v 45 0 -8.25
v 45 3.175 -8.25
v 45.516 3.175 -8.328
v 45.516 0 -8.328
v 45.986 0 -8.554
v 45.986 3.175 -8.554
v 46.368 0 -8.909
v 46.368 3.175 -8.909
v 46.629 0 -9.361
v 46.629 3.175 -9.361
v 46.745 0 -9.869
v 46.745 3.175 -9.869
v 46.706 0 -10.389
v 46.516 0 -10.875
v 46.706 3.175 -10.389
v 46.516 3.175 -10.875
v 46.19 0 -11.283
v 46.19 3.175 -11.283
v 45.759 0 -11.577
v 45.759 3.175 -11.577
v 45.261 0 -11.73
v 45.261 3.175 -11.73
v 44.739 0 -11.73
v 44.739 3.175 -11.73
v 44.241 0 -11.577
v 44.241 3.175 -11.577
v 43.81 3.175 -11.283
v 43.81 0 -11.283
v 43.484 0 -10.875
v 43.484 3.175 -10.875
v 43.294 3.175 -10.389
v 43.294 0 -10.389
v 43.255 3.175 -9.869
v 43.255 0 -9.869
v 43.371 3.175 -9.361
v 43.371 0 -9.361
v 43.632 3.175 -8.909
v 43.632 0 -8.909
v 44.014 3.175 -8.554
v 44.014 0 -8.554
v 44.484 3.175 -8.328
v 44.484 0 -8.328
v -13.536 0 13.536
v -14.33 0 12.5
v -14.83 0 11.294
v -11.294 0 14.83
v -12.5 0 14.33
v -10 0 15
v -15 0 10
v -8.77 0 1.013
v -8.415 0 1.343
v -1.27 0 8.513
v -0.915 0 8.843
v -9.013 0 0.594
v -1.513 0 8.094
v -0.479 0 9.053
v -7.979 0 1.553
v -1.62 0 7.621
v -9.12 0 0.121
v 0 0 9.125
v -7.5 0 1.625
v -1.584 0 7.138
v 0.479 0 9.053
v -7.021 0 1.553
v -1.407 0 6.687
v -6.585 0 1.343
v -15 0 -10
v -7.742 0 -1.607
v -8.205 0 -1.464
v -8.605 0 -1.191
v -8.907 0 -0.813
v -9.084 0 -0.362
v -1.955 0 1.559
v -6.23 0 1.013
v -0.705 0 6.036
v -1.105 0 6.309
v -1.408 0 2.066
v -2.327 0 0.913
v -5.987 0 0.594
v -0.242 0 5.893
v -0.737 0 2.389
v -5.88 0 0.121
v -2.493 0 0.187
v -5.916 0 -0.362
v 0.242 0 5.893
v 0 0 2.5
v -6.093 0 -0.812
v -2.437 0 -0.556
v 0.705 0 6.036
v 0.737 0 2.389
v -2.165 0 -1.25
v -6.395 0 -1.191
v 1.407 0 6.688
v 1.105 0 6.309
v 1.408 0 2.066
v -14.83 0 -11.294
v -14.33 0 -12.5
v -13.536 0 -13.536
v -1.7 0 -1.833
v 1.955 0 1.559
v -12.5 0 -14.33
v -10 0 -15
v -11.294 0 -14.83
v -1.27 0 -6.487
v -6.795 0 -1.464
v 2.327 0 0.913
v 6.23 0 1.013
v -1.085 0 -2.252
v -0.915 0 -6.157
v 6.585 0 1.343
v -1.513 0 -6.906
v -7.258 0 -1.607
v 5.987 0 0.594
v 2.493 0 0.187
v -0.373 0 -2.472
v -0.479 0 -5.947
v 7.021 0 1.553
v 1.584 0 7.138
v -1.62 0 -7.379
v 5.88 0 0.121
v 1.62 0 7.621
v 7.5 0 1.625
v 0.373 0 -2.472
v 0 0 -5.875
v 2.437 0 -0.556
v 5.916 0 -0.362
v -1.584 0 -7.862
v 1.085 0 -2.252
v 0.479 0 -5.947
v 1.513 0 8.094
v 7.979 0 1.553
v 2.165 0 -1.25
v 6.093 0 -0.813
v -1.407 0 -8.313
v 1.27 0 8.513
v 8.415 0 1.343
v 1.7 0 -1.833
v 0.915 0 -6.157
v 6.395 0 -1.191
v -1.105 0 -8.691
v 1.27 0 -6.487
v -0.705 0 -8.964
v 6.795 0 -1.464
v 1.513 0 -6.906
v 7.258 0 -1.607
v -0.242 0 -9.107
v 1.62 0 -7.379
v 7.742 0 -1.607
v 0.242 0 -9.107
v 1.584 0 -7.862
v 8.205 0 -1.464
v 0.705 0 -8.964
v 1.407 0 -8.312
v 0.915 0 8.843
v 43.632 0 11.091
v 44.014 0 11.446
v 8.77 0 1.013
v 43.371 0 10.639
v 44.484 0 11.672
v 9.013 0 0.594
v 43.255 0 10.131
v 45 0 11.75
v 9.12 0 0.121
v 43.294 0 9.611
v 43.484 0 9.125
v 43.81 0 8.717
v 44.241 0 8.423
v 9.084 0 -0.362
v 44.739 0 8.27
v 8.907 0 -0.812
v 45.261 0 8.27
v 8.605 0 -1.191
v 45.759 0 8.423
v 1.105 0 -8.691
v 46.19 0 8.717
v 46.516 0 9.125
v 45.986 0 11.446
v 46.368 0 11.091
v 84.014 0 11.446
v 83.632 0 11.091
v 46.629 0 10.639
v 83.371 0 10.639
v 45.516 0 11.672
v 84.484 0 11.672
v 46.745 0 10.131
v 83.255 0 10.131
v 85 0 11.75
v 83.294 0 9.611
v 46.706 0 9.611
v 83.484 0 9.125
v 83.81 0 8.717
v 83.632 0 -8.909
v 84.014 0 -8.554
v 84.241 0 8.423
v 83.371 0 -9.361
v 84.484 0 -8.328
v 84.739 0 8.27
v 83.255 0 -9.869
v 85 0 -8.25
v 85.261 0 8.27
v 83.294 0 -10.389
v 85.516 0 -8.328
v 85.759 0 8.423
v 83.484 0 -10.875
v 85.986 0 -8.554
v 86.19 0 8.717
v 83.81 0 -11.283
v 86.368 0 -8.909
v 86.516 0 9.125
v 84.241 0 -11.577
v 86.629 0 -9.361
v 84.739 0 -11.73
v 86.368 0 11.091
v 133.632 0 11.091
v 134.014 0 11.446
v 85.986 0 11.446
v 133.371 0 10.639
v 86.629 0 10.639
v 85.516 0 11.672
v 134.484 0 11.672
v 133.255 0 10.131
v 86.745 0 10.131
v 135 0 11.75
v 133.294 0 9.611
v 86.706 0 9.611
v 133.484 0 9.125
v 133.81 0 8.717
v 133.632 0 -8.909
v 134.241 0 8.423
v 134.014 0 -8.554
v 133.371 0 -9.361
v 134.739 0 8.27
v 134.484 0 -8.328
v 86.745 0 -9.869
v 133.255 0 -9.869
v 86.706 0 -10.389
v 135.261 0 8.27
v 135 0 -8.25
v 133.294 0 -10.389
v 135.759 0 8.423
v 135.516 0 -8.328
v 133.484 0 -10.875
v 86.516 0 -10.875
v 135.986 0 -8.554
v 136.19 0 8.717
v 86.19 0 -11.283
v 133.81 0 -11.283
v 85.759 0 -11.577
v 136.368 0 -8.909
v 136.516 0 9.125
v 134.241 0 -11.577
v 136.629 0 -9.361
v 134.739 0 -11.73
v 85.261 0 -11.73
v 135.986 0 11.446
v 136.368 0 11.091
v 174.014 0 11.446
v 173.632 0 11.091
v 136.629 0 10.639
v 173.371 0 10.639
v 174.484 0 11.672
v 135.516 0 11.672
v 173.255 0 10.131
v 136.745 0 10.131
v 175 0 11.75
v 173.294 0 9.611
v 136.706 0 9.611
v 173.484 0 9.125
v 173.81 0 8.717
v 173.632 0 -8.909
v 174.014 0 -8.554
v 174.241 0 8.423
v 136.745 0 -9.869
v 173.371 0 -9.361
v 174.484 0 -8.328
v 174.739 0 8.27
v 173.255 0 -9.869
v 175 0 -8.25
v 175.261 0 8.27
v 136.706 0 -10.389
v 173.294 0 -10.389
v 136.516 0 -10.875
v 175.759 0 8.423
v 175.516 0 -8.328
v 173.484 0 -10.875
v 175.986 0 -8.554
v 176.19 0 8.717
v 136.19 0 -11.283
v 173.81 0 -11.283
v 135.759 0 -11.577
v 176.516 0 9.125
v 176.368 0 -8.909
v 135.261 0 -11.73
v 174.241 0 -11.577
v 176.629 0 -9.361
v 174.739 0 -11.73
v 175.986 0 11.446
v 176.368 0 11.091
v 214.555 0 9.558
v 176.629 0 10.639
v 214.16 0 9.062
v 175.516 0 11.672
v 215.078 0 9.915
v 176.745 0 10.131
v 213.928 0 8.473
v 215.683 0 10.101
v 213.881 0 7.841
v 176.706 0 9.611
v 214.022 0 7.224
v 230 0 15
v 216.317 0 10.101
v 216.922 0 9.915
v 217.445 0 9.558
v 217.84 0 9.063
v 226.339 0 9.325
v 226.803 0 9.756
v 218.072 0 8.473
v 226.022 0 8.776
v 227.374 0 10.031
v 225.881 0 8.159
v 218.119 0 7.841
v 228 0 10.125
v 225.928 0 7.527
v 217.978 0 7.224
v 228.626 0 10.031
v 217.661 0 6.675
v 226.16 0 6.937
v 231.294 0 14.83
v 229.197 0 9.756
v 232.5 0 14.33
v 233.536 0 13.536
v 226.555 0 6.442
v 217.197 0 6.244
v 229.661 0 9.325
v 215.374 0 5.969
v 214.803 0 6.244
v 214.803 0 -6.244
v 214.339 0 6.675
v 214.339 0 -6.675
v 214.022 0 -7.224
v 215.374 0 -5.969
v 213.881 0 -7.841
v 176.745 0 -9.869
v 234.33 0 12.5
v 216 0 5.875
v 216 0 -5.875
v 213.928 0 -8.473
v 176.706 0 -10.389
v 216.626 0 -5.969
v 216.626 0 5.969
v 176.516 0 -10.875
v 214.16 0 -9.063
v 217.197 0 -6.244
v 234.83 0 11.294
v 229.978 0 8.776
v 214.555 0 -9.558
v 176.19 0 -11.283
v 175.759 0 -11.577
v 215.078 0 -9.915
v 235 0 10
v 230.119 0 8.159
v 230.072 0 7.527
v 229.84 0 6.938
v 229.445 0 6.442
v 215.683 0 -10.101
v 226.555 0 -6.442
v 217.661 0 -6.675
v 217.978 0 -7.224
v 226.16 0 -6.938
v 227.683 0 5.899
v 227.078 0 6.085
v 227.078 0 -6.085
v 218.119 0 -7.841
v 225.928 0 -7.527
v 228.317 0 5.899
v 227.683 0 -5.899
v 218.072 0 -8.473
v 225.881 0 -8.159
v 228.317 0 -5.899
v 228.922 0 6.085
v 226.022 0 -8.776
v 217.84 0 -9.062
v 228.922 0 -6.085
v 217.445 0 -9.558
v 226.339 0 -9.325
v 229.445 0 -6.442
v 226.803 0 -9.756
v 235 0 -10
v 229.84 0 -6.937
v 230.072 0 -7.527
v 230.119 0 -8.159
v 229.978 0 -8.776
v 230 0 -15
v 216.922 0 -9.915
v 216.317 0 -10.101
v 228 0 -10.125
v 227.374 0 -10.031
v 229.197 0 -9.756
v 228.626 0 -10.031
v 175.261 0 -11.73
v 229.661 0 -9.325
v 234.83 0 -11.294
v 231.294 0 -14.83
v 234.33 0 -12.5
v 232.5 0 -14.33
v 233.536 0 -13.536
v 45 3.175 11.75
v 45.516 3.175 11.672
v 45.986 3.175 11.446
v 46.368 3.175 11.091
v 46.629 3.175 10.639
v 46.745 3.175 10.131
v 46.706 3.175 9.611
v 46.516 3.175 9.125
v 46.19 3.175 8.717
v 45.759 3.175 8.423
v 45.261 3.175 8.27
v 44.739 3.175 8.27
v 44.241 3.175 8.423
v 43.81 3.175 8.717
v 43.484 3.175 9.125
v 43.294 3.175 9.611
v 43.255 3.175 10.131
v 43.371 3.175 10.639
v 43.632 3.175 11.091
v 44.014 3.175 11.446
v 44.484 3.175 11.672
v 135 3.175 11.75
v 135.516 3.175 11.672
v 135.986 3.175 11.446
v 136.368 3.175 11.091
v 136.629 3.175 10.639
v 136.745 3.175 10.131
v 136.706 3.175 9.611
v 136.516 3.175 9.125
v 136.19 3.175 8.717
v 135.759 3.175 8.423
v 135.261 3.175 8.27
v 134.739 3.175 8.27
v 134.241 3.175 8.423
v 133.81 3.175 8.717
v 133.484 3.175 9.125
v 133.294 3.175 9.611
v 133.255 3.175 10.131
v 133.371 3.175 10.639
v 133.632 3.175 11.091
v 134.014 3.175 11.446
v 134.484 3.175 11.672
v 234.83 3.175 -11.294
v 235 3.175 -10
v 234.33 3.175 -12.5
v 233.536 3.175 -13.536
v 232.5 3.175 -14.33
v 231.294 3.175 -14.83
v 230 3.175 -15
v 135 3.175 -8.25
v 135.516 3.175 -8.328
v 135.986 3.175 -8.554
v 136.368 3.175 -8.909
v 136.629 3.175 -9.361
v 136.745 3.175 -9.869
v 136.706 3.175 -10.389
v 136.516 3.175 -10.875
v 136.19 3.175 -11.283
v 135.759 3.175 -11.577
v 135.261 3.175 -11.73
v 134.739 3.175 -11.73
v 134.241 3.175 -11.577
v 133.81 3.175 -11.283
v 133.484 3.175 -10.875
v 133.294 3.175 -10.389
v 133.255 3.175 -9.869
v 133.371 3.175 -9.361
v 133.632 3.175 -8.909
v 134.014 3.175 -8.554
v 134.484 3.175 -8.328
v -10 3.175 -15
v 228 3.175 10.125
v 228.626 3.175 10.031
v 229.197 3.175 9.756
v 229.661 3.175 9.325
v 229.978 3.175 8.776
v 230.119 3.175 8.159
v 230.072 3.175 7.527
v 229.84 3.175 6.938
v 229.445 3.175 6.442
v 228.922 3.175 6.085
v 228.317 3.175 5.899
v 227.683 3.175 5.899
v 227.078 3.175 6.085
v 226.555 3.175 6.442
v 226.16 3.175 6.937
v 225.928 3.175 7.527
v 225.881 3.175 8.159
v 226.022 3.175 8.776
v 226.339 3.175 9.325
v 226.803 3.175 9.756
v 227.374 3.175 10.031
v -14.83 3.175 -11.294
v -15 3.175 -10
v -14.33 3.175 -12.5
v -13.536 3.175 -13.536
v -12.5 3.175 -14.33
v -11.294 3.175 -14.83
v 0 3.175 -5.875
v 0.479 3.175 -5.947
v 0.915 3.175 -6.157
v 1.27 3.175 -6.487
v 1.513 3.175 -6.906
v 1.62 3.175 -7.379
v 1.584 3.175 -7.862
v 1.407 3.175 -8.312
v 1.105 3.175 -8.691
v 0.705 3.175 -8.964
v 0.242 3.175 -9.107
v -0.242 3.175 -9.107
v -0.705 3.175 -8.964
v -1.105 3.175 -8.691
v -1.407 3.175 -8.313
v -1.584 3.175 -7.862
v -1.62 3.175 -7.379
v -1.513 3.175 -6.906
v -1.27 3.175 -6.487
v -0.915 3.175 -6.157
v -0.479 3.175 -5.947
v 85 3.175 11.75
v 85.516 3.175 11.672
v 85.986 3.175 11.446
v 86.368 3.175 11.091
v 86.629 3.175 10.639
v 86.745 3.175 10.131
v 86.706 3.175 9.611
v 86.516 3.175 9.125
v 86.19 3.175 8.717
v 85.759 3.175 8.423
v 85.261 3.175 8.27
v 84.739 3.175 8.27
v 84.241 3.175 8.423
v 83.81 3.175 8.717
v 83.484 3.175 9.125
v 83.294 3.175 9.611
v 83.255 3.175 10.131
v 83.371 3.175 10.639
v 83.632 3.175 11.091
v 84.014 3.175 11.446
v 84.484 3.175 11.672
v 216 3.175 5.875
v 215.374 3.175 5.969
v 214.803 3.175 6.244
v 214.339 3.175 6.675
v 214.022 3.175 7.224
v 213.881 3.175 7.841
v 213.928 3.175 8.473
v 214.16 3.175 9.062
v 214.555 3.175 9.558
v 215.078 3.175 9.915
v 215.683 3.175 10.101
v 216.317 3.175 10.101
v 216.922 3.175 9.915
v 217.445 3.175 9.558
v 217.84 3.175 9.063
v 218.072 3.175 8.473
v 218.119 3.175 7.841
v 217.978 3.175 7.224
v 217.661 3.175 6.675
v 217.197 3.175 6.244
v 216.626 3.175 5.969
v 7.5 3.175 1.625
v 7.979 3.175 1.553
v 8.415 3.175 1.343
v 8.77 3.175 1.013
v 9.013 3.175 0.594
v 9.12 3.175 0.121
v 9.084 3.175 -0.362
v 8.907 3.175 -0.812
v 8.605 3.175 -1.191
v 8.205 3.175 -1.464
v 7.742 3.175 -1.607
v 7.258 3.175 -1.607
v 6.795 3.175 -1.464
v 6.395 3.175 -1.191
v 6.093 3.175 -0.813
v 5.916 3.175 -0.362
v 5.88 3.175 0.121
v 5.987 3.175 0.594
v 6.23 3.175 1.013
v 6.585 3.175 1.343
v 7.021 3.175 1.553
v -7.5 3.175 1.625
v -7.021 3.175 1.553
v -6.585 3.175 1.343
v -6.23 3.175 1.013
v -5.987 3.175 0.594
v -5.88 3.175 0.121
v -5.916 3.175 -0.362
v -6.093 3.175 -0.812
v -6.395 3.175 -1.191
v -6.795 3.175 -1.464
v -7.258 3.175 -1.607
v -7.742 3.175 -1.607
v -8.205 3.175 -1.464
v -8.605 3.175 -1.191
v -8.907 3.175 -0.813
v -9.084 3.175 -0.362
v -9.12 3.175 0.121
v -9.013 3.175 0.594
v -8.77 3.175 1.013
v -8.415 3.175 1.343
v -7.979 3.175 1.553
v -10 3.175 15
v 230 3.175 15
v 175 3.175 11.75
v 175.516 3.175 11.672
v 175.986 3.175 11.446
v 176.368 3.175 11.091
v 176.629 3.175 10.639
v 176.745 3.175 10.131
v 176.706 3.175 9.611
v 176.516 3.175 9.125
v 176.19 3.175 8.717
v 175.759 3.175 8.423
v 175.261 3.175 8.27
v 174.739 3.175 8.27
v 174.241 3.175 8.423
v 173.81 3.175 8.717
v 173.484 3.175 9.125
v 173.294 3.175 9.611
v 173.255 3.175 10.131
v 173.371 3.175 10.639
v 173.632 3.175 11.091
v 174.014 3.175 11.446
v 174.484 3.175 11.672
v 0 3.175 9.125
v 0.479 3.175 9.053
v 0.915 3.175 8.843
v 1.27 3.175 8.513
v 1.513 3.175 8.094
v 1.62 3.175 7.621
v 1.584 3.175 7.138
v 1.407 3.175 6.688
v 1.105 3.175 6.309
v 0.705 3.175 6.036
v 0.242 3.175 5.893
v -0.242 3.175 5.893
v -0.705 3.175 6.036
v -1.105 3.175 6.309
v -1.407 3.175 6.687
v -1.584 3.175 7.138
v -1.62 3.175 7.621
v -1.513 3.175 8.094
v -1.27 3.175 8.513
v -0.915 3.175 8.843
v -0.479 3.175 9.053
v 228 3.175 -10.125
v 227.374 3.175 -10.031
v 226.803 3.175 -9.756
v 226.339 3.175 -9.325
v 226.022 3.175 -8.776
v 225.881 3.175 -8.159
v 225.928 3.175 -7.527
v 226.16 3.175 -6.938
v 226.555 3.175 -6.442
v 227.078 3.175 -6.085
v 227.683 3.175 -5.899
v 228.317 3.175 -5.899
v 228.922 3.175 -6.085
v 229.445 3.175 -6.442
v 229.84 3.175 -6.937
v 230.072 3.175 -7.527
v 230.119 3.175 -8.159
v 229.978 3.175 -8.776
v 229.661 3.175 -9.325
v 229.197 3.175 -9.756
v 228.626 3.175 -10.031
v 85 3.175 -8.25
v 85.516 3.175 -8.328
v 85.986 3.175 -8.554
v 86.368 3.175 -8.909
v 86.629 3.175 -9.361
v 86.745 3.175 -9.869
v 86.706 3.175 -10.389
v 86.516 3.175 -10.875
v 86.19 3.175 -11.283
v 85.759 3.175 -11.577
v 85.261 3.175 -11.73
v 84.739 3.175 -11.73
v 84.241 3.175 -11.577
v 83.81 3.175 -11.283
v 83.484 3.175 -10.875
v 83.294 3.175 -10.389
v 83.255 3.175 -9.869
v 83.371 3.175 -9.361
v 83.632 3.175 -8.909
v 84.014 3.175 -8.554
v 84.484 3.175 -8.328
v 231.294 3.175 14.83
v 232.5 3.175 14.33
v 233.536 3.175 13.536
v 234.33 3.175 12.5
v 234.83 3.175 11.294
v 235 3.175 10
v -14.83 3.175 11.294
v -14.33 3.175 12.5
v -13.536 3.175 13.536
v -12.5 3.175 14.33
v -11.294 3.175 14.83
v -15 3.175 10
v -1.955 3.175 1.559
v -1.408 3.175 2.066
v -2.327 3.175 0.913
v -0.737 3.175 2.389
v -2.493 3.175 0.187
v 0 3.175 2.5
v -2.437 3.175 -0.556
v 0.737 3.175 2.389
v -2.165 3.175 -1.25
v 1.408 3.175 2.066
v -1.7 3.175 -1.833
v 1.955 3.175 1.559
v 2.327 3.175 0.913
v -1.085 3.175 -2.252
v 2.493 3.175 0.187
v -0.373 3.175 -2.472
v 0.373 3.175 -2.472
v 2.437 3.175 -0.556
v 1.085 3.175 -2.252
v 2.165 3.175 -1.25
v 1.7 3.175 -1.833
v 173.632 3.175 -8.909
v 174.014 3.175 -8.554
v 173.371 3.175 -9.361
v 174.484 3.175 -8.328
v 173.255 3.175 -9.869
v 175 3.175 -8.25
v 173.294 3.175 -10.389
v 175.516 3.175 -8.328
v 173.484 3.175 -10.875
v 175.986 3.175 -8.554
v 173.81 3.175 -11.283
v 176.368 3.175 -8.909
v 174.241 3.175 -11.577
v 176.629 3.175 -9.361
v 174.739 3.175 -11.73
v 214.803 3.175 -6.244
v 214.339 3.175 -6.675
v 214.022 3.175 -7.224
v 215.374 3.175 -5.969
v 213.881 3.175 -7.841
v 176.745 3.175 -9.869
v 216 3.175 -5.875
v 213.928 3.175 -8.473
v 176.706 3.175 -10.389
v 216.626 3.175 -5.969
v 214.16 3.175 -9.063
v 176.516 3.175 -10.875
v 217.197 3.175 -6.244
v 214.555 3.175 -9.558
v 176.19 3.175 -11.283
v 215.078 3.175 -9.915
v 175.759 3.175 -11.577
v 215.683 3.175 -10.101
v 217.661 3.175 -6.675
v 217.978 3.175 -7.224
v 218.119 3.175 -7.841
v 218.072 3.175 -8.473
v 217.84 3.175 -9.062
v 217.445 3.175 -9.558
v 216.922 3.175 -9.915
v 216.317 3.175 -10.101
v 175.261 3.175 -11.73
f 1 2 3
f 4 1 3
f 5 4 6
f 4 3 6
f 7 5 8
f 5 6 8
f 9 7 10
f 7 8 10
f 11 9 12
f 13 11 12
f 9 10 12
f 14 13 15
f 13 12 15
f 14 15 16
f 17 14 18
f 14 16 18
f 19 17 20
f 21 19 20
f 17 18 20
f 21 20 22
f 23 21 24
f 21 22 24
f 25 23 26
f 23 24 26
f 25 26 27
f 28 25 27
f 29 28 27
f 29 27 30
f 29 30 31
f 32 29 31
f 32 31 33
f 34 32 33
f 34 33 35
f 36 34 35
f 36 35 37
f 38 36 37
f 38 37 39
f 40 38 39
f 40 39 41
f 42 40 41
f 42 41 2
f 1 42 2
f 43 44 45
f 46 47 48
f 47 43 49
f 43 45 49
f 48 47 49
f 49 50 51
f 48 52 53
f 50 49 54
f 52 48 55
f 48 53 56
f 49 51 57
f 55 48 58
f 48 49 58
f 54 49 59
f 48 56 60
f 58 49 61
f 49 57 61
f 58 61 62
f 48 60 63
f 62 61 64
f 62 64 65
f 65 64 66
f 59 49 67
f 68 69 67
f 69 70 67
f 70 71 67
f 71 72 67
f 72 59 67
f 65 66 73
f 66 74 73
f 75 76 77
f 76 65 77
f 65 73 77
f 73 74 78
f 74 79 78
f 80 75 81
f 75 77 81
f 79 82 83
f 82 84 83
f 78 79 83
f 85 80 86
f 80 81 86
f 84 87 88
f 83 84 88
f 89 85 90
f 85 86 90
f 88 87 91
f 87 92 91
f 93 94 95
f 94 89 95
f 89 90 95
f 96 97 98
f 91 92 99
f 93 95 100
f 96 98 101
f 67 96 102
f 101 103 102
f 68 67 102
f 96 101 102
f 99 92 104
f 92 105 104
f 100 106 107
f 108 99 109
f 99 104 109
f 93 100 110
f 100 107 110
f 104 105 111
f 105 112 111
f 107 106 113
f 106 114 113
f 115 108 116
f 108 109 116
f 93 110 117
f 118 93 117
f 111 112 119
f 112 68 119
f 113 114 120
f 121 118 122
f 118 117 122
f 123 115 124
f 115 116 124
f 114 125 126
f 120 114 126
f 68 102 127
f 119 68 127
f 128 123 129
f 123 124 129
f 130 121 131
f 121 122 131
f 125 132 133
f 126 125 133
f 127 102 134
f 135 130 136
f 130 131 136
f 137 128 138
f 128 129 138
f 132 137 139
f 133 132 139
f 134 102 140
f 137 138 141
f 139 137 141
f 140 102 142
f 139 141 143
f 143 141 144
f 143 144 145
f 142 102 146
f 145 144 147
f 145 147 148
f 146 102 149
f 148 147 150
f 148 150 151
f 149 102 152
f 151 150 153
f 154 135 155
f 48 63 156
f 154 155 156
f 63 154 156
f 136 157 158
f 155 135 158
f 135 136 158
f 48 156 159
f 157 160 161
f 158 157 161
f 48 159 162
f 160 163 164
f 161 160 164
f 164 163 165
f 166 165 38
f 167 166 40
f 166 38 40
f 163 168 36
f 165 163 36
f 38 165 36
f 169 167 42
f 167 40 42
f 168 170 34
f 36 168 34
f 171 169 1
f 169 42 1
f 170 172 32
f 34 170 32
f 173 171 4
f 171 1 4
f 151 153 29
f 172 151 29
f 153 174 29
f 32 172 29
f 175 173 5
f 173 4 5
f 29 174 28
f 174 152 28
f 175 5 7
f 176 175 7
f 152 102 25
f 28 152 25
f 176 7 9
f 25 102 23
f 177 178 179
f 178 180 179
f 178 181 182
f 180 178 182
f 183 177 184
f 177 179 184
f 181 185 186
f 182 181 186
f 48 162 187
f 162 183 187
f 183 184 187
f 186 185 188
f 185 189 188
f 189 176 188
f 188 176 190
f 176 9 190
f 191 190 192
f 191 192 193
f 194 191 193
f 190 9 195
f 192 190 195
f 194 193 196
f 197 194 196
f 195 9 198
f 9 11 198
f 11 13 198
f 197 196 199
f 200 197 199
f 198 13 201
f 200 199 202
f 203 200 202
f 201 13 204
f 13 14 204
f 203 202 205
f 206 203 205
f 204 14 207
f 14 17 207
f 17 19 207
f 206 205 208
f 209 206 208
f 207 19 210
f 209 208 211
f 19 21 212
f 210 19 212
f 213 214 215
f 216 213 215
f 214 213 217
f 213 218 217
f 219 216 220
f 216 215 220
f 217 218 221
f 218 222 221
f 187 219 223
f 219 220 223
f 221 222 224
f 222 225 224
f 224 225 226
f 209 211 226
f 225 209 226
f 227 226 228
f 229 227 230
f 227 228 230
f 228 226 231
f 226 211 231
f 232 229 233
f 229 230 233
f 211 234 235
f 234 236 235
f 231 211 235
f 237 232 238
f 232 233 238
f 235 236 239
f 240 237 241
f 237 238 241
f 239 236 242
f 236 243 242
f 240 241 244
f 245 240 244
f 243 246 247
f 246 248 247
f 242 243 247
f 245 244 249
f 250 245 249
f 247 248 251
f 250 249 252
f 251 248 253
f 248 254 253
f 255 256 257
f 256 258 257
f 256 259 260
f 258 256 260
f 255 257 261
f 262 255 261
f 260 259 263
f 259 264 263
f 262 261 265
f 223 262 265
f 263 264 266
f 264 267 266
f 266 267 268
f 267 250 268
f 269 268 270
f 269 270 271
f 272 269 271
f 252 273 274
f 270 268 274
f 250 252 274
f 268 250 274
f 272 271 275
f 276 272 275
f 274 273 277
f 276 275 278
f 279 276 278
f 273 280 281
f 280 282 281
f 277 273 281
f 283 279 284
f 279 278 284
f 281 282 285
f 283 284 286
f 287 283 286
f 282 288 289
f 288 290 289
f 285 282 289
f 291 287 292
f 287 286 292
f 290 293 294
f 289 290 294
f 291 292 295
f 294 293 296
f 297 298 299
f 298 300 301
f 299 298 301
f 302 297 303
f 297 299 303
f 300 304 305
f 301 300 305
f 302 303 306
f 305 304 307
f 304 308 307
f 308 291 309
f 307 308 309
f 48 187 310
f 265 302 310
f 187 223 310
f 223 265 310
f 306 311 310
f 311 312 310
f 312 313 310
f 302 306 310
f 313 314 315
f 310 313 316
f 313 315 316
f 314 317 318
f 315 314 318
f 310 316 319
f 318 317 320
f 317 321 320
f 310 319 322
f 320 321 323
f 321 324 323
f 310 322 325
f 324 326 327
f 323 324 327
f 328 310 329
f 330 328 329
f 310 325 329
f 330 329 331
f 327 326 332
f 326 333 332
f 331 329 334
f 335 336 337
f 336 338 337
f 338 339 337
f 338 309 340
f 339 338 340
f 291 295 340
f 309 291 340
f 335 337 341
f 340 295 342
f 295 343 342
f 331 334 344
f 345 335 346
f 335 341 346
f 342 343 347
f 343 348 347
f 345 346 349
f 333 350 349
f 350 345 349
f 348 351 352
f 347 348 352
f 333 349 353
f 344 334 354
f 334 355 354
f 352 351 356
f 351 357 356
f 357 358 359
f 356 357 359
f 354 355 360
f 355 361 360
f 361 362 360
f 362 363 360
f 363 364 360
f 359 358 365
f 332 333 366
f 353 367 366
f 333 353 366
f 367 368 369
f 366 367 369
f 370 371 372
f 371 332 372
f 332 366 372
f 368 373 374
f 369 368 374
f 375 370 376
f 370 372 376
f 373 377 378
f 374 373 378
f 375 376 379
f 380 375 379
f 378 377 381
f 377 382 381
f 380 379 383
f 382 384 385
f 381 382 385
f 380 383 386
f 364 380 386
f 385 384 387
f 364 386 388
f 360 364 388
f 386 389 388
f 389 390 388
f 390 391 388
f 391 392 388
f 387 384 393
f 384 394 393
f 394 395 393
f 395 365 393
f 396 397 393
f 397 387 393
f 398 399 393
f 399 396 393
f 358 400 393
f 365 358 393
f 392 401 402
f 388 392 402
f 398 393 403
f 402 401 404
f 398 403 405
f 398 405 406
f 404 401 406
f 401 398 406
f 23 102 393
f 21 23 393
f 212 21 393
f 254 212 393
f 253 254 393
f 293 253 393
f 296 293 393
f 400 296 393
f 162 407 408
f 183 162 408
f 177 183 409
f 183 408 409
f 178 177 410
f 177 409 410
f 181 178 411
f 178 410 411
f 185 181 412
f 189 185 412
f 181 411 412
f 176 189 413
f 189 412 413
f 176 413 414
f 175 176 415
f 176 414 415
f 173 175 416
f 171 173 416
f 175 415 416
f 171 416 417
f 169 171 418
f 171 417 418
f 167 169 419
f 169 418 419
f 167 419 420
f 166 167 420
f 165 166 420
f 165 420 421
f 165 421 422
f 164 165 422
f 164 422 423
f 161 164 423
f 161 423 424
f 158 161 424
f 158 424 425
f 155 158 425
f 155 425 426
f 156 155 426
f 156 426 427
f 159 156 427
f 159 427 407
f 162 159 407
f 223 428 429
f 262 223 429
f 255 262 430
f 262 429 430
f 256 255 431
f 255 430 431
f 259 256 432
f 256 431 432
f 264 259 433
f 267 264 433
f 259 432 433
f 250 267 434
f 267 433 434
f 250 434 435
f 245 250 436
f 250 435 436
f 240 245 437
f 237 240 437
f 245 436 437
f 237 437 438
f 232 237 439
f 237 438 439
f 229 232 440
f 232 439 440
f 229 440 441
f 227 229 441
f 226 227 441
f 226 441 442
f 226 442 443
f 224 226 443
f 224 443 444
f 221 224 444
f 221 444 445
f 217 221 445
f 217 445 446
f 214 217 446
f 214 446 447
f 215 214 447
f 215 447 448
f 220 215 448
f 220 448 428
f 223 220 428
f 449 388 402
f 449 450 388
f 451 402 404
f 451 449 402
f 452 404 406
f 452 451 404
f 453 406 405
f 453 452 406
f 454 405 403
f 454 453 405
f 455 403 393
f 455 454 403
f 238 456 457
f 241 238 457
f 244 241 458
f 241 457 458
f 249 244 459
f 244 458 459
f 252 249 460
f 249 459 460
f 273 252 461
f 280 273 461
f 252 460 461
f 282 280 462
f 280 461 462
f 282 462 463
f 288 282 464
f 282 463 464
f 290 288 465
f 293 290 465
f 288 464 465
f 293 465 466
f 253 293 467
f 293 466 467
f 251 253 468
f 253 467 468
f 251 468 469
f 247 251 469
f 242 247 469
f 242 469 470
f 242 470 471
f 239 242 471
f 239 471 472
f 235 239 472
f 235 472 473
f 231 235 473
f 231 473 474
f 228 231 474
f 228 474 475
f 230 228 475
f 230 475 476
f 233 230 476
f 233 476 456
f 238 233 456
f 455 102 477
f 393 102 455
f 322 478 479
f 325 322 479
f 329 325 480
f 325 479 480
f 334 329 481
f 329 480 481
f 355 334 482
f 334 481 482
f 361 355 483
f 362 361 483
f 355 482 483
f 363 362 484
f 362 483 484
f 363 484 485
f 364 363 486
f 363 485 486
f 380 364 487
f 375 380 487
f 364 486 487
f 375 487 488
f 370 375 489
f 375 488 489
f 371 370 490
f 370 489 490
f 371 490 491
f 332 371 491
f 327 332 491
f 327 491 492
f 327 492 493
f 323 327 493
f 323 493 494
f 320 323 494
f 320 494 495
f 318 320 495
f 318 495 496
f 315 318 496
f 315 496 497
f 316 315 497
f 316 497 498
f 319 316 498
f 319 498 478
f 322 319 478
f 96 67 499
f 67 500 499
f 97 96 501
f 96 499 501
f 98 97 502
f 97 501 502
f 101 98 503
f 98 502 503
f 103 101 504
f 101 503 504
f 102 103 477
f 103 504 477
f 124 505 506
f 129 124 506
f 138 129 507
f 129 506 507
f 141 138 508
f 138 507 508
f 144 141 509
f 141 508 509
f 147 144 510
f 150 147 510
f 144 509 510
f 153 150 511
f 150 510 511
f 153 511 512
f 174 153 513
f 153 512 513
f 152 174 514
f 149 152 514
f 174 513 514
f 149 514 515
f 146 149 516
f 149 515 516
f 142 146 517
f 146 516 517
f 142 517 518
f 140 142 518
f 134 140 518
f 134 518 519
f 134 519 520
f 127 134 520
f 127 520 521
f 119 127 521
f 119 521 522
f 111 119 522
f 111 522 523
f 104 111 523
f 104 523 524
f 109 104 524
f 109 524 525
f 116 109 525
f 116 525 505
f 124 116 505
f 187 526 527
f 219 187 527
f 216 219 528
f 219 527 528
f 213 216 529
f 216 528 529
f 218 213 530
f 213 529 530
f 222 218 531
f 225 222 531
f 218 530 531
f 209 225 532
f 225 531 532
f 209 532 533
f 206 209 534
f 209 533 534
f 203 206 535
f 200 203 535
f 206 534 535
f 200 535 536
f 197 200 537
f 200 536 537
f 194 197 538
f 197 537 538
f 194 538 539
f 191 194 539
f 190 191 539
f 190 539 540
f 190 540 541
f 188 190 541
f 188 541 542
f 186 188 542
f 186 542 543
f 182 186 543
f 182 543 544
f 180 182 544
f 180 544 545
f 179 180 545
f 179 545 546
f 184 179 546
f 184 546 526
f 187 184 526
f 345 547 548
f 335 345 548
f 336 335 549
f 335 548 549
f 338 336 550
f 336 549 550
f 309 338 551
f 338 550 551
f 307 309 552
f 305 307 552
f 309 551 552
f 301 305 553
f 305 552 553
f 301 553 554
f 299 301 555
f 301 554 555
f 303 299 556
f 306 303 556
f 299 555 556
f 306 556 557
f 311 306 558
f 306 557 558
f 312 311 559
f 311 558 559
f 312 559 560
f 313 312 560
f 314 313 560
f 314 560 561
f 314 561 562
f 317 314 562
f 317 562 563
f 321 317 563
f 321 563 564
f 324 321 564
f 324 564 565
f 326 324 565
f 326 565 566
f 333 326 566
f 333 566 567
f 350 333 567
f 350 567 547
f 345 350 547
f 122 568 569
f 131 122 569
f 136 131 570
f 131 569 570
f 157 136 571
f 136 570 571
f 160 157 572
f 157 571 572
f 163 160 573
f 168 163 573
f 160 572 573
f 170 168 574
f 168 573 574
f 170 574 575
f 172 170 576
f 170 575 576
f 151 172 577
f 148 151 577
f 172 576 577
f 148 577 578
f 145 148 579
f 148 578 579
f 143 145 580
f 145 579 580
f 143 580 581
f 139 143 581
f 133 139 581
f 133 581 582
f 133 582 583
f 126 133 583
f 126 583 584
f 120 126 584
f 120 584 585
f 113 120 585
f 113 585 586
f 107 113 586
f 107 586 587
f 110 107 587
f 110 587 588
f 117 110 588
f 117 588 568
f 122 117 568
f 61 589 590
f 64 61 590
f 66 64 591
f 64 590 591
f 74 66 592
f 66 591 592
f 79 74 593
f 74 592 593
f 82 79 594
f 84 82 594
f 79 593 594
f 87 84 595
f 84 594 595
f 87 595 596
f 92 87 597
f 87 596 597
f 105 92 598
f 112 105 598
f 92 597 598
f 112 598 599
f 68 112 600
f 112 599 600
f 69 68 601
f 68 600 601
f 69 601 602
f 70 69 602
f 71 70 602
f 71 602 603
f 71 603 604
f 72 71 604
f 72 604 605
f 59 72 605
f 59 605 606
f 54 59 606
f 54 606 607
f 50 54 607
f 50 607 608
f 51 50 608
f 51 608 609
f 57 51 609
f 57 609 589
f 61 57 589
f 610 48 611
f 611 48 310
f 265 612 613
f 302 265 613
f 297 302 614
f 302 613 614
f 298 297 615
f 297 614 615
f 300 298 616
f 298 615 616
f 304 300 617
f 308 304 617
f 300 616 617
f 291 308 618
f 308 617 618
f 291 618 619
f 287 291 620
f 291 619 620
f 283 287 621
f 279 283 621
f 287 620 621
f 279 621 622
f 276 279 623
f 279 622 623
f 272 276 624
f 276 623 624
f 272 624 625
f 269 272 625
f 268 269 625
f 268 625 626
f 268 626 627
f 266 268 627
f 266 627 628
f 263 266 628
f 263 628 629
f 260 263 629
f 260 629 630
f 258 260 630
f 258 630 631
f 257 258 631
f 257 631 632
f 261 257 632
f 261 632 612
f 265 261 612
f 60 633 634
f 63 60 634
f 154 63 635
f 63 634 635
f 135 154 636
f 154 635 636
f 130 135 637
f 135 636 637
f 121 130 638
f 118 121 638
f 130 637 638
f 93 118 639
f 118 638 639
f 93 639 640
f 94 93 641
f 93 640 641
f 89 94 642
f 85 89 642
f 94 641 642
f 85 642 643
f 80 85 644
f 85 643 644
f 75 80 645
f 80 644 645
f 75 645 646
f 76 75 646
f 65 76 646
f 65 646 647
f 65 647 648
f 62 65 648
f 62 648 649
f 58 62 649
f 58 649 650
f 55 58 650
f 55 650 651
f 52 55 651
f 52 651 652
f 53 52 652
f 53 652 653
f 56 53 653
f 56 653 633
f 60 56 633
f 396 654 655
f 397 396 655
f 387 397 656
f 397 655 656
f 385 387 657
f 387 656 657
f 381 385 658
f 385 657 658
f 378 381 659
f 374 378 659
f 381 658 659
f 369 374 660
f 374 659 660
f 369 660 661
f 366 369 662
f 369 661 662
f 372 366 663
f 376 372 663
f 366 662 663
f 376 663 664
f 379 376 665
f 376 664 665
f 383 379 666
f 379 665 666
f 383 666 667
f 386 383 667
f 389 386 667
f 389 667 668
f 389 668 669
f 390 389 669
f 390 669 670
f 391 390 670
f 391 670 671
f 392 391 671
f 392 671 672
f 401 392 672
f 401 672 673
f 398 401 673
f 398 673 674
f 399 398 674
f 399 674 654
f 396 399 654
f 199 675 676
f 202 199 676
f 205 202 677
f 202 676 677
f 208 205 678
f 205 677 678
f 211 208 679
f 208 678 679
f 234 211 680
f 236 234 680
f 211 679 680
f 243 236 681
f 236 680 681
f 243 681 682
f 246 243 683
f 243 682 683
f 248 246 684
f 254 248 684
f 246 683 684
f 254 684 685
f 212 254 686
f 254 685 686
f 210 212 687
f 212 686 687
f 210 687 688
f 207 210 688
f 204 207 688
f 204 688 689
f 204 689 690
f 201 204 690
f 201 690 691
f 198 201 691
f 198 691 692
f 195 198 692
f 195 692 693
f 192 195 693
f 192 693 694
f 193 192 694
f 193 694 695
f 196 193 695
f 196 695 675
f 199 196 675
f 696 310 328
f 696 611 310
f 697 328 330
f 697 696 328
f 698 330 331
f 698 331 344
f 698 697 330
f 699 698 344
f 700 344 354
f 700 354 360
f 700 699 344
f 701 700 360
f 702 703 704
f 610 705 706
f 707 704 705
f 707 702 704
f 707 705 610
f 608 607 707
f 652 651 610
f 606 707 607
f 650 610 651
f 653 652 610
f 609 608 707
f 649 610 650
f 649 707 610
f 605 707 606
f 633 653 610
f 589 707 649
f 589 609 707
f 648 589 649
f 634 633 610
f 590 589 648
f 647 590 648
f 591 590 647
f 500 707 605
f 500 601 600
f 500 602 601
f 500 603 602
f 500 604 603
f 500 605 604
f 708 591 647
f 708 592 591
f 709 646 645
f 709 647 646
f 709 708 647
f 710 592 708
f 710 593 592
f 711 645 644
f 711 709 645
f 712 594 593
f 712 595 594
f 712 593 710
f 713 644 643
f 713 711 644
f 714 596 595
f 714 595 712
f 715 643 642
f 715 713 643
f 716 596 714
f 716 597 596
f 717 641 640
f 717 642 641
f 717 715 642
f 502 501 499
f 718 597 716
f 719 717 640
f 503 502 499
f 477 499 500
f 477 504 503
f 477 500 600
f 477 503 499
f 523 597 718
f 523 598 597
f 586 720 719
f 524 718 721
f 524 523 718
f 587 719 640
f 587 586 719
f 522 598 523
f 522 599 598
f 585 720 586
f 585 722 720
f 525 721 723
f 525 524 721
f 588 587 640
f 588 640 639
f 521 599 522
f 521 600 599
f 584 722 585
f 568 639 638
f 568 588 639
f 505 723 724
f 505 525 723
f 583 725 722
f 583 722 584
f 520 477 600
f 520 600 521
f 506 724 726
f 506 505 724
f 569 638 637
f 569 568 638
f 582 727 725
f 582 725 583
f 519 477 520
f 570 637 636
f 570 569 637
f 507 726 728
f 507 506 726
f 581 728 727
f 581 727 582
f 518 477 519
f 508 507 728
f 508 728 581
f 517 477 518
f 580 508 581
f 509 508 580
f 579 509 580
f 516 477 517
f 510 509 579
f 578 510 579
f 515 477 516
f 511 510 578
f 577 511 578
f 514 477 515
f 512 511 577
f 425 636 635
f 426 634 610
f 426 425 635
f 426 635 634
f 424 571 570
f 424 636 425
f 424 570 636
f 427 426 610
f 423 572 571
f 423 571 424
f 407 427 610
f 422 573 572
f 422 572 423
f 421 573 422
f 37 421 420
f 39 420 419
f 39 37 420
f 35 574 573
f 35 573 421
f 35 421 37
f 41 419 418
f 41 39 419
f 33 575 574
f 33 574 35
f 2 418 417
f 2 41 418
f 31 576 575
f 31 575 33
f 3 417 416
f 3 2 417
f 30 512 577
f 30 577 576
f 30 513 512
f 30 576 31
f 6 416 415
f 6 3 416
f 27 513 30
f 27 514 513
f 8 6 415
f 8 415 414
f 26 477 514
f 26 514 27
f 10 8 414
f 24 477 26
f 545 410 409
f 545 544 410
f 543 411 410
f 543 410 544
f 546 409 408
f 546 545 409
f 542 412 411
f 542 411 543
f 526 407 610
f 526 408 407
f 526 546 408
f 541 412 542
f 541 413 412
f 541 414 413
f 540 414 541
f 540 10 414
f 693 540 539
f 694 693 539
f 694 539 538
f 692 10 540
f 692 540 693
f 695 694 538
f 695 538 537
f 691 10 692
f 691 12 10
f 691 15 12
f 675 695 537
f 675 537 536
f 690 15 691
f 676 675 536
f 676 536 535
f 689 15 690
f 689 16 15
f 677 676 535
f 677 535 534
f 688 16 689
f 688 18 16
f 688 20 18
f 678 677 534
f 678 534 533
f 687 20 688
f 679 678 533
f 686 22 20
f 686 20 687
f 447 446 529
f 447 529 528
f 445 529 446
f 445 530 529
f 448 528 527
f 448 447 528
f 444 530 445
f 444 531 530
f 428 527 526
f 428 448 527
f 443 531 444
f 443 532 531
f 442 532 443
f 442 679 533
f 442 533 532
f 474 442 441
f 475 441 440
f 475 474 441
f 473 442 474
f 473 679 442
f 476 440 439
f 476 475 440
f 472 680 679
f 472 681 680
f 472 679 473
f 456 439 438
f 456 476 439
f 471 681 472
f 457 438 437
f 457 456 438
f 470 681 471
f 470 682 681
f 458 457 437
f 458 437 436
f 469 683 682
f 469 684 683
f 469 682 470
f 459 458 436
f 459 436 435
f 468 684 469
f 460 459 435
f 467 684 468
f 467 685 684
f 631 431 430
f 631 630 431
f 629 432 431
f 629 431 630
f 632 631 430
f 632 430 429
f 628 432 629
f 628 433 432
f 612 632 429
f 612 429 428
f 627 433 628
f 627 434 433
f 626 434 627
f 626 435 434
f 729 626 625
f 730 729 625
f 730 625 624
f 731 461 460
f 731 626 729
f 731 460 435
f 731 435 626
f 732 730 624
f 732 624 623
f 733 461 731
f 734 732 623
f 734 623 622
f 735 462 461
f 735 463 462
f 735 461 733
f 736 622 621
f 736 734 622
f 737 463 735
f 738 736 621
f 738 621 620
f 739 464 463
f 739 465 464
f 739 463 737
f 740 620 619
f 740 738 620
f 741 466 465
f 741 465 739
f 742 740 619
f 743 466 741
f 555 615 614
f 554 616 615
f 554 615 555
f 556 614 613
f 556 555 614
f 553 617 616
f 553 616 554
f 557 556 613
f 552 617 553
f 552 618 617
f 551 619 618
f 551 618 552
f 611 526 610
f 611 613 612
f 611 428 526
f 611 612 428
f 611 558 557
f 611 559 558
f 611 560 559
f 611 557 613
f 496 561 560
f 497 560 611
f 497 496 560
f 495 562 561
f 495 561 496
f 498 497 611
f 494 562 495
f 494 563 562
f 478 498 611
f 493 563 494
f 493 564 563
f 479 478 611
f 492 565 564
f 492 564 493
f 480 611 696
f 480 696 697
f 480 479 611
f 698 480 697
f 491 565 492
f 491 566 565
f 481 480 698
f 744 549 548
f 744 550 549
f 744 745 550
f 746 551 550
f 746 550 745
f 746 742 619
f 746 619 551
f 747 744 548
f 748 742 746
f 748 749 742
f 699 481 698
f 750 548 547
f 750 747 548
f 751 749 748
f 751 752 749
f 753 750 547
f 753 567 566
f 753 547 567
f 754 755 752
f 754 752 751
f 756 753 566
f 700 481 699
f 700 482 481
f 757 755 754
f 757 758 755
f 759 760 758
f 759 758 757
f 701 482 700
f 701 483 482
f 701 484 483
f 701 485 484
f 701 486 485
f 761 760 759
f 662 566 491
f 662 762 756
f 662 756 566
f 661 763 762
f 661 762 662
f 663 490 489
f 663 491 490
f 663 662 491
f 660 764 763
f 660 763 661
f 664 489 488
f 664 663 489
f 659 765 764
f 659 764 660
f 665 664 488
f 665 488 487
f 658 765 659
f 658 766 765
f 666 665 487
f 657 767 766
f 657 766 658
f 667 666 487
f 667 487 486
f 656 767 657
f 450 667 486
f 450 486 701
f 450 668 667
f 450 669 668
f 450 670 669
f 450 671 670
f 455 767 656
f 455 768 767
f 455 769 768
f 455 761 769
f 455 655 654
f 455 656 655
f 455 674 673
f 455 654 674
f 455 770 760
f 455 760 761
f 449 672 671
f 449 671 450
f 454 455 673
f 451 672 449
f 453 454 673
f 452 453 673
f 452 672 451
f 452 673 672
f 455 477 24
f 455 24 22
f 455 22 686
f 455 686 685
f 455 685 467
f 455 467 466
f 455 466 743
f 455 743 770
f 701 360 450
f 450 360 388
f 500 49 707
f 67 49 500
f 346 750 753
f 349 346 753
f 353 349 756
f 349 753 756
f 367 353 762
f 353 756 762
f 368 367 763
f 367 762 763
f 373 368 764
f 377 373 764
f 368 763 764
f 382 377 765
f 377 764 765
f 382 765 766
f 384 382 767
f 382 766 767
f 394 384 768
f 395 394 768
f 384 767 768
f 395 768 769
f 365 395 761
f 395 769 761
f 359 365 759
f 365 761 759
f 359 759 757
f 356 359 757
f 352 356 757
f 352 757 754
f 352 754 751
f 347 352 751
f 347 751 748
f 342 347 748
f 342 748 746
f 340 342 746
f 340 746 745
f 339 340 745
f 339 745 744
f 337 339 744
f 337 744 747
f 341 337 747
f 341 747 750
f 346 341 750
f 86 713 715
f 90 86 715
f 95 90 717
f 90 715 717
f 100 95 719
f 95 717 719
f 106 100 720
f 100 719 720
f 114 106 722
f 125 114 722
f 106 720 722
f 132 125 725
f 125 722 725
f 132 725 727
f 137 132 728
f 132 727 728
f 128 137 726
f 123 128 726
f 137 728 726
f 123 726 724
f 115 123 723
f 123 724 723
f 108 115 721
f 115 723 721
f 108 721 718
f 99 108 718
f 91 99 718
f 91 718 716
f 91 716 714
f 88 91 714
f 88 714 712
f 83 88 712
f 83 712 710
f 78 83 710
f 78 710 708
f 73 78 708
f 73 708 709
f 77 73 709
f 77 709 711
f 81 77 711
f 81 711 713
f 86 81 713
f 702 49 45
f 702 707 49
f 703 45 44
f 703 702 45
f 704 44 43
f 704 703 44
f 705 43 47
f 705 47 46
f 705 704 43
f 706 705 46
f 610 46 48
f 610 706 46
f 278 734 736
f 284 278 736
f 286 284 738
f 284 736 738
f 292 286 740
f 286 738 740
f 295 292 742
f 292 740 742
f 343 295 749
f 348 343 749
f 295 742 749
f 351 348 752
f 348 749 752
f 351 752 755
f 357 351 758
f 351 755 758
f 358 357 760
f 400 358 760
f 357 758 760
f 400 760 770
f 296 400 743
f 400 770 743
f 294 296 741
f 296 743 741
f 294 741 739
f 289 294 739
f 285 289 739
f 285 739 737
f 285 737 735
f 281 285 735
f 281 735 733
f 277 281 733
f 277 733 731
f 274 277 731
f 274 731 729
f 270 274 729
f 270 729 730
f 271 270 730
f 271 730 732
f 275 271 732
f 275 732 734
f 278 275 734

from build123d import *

# Parameters (mm, degrees)
SKETCH1_W           = 250
SKETCH1_H           = 30
BOSS_EXTRUDE1_DEPTH = 3.175
FILLET1_R           = 5
SKETCH2_R           = 2.5
CUT_EXTRUDE1_DEPTH  = 236.499640393
SKETCH3_R           = 1.625
CUT_EXTRUDE3_DEPTH  = 236.499640393
SKETCH4_R           = 1.75
CUT_EXTRUDE4_DEPTH  = 10
SKETCH5_R           = 2.125
CUT_EXTRUDE5_DEPTH  = 236.499640393


with BuildPart() as part:
    # Sketch1 → Boss-Extrude1 (new body)
    with BuildSketch(Plane(origin=(0, 0, 0), x_dir=(1, 0, 0), z_dir=(0, 1, 0))):
        with Locations((110, 0)):
            Rectangle(SKETCH1_W, SKETCH1_H)
    extrude(amount=BOSS_EXTRUDE1_DEPTH)

    # Fillet1
    fillet1_edges = [part.edges().sort_by_distance(p)[0] for p in [
        (-15, 1.5875, -15),
        (235, 1.5875, -15),
        (235, 1.5875, 15),
        (-15, 1.5875, 15),
    ]]
    fillet(fillet1_edges, radius=FILLET1_R)

    # Sketch2 → Cut-Extrude1 (cut, through all)
    with BuildSketch(Plane(origin=(0, 3.175, 0), x_dir=(1, 0, 0), z_dir=(0, 1, 0))):
        with Locations(Location((0, 0, 0), (0, 0, 270))):
            Circle(SKETCH2_R)
    extrude(amount=-CUT_EXTRUDE1_DEPTH, mode=Mode.SUBTRACT)

    # Sketch3 → Cut-Extrude3 (cut, through all)
    with BuildSketch(Plane(origin=(0, 3.175, 0), x_dir=(1, 0, 0), z_dir=(0, 1, 0))):
        with Locations(Location((7.5, 0, 0), (0, 0, 270))):
            Circle(SKETCH3_R)
        with Locations(Location((0, -7.5, 0), (0, 0, 270))):
            Circle(SKETCH3_R)
        with Locations(Location((-7.5, 0, 0), (0, 0, 270))):
            Circle(SKETCH3_R)
        with Locations(Location((0, 7.5, 0), (0, 0, 270))):
            Circle(SKETCH3_R)
    extrude(amount=-CUT_EXTRUDE3_DEPTH, mode=Mode.SUBTRACT)

    # Sketch4 → Cut-Extrude4 (cut)
    with BuildSketch(Plane(origin=(0, 3.175, 0), x_dir=(1, 0, 0), z_dir=(0, 1, 0))):
        with Locations(Location((85, -10, 0), (0, 0, 270))):
            Circle(SKETCH4_R)
        with Locations(Location((135, -10, 0), (0, 0, 270))):
            Circle(SKETCH4_R)
        with Locations(Location((135, 10, 0), (0, 0, 270))):
            Circle(SKETCH4_R)
        with Locations(Location((85, 10, 0), (0, 0, 270))):
            Circle(SKETCH4_R)
        with Locations(Location((175, -10, 0), (0, 0, 270))):
            Circle(SKETCH4_R)
        with Locations(Location((175, 10, 0), (0, 0, 270))):
            Circle(SKETCH4_R)
        with Locations(Location((45, -10, 0), (0, 0, 270))):
            Circle(SKETCH4_R)
        with Locations(Location((45, 10, 0), (0, 0, 270))):
            Circle(SKETCH4_R)
    extrude(amount=-CUT_EXTRUDE4_DEPTH, mode=Mode.SUBTRACT)

    # Sketch5 → Cut-Extrude5 (cut, through all)
    with BuildSketch(Plane(origin=(0, 3.175, 0), x_dir=(1, 0, 0), z_dir=(0, 1, 0))):
        with Locations(Location((216, 8, 0), (0, 0, 270))):
            Circle(SKETCH5_R)
        with Locations(Location((228, 8, 0), (0, 0, 90))):
            Circle(SKETCH5_R)
        with Locations(Location((228, -8, 0), (0, 0, 270))):
            Circle(SKETCH5_R)
        with Locations(Location((216, -8, 0), (0, 0, 90))):
            Circle(SKETCH5_R)
    extrude(amount=-CUT_EXTRUDE5_DEPTH, mode=Mode.SUBTRACT)


solid = part.part
